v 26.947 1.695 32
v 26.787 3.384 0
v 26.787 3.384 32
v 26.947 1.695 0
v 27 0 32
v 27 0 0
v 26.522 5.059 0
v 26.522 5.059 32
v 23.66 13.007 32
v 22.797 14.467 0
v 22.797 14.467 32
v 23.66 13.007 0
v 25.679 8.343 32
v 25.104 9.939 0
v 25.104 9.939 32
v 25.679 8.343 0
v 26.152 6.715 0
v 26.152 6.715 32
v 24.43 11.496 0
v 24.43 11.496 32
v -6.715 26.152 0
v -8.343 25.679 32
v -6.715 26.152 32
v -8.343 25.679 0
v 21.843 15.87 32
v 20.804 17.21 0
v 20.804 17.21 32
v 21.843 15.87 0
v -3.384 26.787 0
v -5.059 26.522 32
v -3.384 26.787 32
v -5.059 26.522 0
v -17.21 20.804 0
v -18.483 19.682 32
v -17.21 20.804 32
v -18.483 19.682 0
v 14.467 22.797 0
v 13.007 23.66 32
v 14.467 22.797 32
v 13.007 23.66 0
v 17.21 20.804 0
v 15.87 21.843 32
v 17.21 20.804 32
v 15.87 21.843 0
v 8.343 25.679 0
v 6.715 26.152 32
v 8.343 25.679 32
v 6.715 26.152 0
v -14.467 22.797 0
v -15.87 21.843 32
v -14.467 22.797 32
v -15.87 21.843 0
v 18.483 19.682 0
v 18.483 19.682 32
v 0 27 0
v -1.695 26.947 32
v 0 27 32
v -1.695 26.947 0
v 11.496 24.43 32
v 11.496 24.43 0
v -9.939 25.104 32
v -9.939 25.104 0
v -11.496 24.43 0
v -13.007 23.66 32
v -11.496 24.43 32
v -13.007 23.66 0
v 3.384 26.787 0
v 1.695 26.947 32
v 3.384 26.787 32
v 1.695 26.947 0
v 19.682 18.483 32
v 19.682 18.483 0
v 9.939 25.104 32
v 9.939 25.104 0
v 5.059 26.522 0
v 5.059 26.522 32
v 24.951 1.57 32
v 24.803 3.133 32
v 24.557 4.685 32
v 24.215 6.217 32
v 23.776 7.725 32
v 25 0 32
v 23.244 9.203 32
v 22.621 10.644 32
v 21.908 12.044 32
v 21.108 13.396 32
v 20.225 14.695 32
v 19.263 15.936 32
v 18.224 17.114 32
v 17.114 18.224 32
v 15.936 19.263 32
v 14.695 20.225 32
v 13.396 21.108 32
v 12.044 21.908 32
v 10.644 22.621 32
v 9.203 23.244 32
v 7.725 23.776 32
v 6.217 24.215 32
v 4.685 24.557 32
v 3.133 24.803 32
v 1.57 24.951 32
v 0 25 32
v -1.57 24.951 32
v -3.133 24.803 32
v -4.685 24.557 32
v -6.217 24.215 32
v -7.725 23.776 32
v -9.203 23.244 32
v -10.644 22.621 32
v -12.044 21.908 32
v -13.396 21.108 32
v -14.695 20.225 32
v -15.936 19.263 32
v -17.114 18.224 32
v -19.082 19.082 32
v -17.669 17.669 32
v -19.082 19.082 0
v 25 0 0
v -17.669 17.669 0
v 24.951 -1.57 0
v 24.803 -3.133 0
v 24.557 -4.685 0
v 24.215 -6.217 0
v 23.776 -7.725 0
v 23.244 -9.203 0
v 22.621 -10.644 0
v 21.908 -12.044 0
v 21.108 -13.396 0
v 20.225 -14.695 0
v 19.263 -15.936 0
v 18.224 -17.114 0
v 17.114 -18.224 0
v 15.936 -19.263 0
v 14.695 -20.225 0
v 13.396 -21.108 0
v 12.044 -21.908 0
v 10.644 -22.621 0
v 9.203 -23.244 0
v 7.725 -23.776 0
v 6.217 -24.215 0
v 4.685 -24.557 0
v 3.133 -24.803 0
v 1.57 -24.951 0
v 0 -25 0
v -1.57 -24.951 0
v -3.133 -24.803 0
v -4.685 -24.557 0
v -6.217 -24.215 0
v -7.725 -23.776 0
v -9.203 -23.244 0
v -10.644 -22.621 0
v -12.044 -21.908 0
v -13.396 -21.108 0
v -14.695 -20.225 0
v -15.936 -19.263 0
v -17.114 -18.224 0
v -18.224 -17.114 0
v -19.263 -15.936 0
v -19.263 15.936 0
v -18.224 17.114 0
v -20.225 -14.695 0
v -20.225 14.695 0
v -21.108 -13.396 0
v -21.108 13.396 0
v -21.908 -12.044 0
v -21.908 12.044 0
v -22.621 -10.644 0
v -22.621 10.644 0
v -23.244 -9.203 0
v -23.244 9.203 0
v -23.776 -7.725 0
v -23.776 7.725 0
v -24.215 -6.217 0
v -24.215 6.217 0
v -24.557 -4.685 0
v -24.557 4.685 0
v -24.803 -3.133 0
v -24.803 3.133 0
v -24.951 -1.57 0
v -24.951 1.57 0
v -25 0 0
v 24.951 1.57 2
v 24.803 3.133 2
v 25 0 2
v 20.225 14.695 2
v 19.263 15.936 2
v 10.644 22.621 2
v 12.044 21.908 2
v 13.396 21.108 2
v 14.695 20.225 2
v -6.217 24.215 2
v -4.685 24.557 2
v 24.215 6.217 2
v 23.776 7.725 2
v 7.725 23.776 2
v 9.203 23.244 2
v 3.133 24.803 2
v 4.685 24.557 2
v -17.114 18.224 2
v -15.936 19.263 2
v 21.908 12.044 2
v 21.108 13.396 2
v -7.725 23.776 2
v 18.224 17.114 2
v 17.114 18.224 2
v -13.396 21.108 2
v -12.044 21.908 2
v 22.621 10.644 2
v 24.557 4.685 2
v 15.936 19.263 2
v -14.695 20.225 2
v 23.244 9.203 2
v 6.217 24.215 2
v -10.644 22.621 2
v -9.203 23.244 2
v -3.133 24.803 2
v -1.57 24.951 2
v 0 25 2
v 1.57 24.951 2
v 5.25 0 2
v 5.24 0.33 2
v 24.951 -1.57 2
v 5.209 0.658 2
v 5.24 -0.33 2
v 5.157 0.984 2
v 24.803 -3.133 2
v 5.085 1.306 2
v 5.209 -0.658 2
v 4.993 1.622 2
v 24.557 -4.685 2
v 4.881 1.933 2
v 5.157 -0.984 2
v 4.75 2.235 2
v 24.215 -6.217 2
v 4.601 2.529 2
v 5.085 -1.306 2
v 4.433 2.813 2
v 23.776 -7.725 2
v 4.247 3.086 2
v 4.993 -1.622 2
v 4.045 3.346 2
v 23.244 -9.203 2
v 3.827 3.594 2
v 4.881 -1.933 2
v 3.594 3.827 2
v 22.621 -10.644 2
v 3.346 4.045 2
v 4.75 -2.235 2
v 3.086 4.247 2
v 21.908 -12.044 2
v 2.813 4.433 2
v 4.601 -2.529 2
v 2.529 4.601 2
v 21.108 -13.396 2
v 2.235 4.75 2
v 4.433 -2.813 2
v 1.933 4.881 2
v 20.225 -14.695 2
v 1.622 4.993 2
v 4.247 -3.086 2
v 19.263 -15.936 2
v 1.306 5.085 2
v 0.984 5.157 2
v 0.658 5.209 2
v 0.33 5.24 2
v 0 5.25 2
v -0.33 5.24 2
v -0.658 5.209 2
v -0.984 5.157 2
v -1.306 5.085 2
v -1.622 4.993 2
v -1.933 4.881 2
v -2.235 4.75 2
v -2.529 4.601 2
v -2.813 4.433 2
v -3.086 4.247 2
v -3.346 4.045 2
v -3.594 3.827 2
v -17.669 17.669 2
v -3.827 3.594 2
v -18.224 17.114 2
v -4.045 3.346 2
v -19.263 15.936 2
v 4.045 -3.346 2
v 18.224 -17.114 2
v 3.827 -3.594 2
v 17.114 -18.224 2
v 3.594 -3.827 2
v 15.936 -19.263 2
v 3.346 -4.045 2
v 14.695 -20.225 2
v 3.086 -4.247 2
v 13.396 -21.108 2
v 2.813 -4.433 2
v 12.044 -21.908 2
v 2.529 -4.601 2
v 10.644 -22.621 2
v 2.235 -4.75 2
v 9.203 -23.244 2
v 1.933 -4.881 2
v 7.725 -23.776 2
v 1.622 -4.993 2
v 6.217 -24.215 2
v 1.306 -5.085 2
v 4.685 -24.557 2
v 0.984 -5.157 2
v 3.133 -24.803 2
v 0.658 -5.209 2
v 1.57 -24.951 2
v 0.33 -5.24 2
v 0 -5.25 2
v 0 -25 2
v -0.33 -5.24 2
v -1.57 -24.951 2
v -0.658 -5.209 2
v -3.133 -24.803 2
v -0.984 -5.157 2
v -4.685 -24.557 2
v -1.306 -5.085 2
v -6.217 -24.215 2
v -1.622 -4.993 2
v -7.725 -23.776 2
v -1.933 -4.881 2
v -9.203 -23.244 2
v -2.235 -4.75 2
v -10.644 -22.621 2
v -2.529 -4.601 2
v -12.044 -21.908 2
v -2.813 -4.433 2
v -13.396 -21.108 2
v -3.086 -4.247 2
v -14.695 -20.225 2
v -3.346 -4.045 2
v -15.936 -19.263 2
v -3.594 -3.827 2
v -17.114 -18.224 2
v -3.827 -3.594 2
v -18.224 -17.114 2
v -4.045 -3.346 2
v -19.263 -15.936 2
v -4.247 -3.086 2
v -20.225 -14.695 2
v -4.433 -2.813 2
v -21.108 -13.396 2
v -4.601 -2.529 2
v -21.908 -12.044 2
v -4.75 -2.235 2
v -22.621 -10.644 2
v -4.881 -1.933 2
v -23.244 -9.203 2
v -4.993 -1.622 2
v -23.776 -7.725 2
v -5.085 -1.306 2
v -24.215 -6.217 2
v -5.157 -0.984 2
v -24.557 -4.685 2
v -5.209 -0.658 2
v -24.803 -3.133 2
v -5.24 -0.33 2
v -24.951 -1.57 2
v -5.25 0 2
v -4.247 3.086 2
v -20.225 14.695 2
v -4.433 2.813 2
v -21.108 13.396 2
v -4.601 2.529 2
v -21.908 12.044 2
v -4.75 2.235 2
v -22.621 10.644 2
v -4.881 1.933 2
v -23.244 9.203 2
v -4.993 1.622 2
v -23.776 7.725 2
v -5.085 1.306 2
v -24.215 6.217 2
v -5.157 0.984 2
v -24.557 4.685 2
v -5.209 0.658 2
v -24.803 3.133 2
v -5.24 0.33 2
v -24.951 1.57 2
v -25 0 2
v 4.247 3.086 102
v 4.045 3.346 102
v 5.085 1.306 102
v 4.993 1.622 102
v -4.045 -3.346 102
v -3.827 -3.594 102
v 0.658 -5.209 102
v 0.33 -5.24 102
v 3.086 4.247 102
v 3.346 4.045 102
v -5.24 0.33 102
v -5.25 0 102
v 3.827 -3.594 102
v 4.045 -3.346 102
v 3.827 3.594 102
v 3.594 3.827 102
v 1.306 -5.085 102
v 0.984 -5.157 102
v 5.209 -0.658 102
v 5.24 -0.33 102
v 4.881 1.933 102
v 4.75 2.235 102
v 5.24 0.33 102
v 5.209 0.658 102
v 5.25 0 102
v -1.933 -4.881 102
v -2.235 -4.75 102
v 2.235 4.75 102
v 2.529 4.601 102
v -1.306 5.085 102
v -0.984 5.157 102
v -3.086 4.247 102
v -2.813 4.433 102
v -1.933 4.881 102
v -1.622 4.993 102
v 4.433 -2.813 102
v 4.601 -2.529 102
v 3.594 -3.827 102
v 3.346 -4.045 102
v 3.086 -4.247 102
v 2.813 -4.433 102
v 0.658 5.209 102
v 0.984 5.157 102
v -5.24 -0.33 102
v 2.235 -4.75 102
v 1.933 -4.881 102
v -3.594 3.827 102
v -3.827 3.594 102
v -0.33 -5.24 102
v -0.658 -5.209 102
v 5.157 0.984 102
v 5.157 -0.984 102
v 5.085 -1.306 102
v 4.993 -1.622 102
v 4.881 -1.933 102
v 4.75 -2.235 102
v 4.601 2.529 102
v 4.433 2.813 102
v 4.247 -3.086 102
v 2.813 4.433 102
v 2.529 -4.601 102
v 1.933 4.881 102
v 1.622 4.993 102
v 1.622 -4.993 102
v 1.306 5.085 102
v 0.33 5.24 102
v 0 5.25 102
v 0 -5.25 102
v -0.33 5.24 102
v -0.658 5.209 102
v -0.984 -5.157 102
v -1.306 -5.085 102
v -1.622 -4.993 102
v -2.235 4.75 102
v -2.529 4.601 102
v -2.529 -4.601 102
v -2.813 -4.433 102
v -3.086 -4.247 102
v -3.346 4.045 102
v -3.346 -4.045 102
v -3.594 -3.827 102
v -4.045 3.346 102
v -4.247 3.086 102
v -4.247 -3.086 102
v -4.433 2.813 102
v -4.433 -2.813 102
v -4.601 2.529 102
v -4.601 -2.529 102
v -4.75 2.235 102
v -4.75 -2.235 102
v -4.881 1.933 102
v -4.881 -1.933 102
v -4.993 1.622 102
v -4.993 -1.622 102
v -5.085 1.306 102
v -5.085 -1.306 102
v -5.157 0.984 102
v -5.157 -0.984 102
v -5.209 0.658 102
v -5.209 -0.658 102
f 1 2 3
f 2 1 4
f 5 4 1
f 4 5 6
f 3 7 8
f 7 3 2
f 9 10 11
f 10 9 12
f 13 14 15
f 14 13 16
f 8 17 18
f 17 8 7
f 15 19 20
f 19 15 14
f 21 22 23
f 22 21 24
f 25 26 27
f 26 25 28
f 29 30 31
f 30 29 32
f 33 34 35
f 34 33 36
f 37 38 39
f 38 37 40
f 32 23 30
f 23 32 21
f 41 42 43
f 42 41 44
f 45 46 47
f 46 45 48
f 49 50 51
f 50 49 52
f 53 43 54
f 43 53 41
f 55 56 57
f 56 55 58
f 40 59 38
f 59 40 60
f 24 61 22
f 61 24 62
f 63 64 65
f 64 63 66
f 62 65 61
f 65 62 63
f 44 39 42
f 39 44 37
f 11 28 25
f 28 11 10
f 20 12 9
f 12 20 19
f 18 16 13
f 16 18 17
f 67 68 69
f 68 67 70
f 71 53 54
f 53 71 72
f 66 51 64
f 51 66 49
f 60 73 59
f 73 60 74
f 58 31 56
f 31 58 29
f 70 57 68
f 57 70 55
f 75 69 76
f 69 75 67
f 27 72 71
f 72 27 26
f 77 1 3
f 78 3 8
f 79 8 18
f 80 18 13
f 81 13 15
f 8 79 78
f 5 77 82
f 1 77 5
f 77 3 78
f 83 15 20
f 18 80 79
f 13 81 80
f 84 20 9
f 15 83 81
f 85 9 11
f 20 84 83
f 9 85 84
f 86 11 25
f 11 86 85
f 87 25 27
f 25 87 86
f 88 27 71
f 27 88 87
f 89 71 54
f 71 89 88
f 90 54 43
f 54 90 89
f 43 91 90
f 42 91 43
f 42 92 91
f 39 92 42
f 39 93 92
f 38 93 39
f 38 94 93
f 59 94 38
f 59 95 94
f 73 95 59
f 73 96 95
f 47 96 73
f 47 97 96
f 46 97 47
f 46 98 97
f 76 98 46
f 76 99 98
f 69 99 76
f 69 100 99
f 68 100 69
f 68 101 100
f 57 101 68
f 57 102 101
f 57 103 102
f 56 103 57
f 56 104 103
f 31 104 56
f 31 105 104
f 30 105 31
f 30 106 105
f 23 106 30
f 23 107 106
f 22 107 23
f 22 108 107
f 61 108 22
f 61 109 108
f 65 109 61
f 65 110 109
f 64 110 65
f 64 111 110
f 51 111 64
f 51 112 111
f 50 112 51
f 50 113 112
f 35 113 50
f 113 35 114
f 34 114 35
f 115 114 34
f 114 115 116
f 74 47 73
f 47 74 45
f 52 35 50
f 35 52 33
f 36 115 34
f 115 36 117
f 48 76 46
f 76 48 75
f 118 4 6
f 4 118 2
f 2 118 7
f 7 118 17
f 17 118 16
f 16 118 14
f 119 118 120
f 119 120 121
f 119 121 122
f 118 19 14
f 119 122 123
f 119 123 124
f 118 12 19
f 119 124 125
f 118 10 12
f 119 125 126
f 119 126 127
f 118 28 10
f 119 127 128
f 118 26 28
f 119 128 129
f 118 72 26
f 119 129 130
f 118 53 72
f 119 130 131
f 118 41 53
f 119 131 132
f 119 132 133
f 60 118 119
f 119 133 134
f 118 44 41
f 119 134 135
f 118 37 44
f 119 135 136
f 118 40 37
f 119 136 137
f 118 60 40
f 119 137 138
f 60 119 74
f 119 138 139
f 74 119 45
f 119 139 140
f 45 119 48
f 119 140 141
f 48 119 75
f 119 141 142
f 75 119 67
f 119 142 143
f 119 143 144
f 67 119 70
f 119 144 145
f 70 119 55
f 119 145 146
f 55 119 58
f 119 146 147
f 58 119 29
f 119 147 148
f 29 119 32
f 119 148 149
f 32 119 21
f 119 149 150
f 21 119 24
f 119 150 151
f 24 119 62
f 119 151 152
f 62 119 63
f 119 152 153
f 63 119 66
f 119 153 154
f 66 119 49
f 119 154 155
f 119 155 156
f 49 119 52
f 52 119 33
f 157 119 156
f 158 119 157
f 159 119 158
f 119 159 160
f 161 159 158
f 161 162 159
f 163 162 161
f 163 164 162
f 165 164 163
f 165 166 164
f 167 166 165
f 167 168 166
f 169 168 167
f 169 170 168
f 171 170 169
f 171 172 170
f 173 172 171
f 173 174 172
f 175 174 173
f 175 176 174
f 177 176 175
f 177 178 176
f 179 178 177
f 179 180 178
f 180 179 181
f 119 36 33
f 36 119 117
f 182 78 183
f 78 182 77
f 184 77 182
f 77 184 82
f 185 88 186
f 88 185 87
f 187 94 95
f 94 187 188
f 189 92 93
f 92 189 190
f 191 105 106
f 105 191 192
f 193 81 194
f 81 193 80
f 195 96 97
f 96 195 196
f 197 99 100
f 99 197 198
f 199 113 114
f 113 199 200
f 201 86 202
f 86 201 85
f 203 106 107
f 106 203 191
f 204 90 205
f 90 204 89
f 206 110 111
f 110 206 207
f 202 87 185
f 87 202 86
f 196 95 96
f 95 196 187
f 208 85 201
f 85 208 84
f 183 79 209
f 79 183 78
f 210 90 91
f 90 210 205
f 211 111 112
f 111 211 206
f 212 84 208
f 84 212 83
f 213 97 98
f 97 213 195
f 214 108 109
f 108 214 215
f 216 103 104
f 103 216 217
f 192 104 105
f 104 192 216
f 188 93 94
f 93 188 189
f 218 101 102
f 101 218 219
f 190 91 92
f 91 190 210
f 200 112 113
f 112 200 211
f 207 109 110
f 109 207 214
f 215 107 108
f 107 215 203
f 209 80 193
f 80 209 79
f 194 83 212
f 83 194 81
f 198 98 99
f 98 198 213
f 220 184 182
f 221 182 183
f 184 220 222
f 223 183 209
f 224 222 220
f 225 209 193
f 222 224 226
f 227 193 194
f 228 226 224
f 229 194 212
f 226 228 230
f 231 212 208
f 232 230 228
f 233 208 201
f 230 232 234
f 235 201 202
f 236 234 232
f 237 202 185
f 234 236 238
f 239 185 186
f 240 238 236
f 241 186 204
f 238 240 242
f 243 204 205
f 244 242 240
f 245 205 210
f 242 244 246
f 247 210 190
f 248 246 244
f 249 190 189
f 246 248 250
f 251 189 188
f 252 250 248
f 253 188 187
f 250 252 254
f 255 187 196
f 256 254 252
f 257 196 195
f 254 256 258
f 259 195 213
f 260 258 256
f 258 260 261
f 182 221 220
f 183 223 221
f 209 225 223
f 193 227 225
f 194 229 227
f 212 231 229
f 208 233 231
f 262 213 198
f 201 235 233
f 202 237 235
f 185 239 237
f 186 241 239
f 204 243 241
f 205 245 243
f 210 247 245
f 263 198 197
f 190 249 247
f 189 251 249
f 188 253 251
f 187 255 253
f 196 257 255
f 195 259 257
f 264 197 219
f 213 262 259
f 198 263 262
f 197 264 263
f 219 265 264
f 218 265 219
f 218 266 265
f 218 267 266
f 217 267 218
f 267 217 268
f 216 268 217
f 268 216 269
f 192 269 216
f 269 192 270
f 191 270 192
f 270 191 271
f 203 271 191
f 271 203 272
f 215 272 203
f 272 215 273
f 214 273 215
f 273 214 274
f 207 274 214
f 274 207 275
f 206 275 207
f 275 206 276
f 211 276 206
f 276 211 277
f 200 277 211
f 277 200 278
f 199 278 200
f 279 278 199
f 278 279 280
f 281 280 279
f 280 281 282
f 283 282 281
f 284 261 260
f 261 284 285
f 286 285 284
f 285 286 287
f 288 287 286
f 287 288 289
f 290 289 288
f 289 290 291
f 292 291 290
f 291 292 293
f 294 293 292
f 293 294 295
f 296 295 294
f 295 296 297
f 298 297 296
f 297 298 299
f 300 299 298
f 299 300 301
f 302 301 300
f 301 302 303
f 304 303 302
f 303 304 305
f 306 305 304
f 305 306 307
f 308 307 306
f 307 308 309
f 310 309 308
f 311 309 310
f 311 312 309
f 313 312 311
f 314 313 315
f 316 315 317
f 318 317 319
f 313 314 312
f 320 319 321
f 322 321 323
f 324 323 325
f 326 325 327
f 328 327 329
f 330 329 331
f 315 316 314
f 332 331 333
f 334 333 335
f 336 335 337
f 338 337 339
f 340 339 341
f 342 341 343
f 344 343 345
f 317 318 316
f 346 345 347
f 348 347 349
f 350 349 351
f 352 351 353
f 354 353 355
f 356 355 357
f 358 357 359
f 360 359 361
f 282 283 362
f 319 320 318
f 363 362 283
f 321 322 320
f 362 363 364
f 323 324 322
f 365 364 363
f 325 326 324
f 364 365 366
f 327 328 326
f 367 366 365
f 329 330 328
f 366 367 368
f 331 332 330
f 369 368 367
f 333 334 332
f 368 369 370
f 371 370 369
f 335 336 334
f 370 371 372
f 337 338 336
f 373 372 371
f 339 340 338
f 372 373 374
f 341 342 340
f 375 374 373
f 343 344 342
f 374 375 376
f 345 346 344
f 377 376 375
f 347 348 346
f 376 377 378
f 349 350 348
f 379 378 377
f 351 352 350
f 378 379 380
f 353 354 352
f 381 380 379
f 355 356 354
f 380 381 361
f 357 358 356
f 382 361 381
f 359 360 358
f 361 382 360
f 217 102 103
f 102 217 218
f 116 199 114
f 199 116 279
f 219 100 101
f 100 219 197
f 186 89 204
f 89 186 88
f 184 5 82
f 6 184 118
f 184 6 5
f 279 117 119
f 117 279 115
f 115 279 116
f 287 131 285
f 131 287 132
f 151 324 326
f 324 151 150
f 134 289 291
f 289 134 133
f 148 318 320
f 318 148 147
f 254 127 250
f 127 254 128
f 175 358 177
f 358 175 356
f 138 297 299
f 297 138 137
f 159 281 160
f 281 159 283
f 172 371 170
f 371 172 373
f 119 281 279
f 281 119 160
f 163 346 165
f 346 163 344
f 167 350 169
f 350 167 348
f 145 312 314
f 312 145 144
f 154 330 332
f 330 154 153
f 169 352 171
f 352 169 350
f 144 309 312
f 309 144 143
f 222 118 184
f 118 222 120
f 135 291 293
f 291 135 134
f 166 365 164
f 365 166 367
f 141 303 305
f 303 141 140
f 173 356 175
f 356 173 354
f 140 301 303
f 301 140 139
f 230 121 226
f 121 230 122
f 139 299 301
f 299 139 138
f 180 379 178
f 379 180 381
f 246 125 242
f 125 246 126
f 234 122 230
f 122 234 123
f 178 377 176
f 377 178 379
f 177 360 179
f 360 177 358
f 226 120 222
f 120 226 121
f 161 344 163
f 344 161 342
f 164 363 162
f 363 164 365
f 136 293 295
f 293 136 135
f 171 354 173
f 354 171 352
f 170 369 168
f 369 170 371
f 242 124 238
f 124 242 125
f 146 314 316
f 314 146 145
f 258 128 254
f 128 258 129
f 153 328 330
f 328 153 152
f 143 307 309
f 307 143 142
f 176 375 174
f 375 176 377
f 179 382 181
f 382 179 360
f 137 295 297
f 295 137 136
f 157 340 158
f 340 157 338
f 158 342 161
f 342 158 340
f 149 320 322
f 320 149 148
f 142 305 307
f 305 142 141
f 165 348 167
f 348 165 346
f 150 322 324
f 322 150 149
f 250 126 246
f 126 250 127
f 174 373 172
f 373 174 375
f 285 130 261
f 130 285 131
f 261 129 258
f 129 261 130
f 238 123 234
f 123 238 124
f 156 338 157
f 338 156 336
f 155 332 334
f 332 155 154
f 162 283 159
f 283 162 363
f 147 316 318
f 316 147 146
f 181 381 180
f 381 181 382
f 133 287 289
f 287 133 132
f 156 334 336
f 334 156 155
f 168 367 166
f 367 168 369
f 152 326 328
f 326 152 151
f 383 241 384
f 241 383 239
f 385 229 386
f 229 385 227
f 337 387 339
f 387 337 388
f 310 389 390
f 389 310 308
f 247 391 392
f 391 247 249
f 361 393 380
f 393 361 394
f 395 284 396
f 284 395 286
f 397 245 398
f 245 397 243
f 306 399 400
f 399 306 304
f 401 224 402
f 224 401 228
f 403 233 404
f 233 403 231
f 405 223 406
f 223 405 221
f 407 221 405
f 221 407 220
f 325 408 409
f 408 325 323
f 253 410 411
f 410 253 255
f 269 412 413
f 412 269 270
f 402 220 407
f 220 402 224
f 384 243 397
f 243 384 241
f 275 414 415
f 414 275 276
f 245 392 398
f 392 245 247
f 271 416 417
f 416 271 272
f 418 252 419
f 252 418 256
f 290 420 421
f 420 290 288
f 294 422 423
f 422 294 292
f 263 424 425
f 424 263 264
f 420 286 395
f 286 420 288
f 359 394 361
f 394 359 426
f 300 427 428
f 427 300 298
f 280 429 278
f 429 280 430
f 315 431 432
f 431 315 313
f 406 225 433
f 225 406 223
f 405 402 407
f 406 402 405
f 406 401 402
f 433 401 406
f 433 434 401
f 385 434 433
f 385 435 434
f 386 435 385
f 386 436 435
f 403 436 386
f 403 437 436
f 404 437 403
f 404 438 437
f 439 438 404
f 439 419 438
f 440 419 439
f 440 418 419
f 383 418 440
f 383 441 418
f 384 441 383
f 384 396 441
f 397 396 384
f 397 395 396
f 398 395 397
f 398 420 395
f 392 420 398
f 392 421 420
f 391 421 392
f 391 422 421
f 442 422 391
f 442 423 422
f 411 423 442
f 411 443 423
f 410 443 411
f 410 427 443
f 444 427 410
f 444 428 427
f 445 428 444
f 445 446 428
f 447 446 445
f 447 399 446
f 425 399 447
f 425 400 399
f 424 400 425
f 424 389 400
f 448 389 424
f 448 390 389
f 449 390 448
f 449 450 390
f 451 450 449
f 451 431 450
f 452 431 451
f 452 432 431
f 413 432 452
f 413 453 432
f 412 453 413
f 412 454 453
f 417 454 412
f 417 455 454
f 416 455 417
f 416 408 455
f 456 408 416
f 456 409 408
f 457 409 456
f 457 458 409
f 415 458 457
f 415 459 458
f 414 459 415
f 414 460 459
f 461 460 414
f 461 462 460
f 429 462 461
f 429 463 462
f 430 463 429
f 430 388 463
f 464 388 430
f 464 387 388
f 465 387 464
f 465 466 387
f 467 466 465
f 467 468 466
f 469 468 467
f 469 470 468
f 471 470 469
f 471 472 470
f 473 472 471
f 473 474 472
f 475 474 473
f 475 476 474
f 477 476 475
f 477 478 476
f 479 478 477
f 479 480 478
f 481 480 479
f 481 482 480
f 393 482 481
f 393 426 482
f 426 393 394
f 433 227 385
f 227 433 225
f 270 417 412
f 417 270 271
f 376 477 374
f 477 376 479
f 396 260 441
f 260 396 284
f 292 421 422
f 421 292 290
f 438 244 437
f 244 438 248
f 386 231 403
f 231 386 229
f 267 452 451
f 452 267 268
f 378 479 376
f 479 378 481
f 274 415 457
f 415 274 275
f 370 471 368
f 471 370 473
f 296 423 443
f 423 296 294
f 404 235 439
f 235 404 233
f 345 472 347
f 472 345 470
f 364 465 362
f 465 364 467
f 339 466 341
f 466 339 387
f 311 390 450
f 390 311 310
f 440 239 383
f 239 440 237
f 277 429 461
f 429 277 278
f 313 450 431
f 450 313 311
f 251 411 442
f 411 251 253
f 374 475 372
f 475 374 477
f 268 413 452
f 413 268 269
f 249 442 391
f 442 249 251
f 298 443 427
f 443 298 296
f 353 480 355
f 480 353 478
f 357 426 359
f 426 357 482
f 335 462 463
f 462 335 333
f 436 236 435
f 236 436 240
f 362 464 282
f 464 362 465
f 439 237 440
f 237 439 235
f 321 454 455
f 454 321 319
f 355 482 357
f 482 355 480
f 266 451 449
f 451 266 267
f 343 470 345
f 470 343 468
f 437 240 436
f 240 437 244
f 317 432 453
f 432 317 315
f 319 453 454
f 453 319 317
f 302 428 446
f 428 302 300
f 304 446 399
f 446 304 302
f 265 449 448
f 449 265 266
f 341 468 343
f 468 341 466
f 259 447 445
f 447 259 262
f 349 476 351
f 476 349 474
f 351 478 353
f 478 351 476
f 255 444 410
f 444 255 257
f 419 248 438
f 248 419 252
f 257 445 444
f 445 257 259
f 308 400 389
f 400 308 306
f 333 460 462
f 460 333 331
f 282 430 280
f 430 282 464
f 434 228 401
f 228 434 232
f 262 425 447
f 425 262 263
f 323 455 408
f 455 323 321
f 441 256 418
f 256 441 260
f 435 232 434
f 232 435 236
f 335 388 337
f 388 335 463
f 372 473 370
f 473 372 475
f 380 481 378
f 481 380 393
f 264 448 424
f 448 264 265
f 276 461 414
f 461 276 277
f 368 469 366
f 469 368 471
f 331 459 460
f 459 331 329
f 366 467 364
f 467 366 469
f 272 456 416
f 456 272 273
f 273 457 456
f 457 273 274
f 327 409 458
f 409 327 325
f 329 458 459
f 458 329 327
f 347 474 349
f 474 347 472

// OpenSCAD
$fn = 100;

disk_diameter = 50;   // Diameter 3cm
thickness = 2;        // Thickness for everything (disk and side walls)
sidewall_height = 30; // Height of side walls (adjustable)
center_cylinder_height = 100; // Height of center cylinder (10cm)
center_cylinder_diameter = 10.5; // Diameter of center cylinder
wall_angle = 135;     // Angle of wall around circle (90° = quarter, 180° = half, 270° = three-quarter)

union() {
    cylinder(h = thickness, d = disk_diameter, center = false);
    
    intersection() {
        difference() {
            cylinder(h = thickness + sidewall_height, d = disk_diameter + 2*thickness, center = false);
            translate([0, 0, thickness])
                cylinder(h = sidewall_height + 1, d = disk_diameter, center = false);
        }
        
        linear_extrude(height = thickness + sidewall_height)
            polygon(points = concat([[0, 0]], 
                                  [for (i = [0 : 1 : wall_angle]) 
                                   [(disk_diameter + 2*thickness) * cos(i), (disk_diameter + 2*thickness) * sin(i)]]));
    }
    
    translate([0, 0, thickness])
        cylinder(h = center_cylinder_height, d = center_cylinder_diameter, center = false);
}
